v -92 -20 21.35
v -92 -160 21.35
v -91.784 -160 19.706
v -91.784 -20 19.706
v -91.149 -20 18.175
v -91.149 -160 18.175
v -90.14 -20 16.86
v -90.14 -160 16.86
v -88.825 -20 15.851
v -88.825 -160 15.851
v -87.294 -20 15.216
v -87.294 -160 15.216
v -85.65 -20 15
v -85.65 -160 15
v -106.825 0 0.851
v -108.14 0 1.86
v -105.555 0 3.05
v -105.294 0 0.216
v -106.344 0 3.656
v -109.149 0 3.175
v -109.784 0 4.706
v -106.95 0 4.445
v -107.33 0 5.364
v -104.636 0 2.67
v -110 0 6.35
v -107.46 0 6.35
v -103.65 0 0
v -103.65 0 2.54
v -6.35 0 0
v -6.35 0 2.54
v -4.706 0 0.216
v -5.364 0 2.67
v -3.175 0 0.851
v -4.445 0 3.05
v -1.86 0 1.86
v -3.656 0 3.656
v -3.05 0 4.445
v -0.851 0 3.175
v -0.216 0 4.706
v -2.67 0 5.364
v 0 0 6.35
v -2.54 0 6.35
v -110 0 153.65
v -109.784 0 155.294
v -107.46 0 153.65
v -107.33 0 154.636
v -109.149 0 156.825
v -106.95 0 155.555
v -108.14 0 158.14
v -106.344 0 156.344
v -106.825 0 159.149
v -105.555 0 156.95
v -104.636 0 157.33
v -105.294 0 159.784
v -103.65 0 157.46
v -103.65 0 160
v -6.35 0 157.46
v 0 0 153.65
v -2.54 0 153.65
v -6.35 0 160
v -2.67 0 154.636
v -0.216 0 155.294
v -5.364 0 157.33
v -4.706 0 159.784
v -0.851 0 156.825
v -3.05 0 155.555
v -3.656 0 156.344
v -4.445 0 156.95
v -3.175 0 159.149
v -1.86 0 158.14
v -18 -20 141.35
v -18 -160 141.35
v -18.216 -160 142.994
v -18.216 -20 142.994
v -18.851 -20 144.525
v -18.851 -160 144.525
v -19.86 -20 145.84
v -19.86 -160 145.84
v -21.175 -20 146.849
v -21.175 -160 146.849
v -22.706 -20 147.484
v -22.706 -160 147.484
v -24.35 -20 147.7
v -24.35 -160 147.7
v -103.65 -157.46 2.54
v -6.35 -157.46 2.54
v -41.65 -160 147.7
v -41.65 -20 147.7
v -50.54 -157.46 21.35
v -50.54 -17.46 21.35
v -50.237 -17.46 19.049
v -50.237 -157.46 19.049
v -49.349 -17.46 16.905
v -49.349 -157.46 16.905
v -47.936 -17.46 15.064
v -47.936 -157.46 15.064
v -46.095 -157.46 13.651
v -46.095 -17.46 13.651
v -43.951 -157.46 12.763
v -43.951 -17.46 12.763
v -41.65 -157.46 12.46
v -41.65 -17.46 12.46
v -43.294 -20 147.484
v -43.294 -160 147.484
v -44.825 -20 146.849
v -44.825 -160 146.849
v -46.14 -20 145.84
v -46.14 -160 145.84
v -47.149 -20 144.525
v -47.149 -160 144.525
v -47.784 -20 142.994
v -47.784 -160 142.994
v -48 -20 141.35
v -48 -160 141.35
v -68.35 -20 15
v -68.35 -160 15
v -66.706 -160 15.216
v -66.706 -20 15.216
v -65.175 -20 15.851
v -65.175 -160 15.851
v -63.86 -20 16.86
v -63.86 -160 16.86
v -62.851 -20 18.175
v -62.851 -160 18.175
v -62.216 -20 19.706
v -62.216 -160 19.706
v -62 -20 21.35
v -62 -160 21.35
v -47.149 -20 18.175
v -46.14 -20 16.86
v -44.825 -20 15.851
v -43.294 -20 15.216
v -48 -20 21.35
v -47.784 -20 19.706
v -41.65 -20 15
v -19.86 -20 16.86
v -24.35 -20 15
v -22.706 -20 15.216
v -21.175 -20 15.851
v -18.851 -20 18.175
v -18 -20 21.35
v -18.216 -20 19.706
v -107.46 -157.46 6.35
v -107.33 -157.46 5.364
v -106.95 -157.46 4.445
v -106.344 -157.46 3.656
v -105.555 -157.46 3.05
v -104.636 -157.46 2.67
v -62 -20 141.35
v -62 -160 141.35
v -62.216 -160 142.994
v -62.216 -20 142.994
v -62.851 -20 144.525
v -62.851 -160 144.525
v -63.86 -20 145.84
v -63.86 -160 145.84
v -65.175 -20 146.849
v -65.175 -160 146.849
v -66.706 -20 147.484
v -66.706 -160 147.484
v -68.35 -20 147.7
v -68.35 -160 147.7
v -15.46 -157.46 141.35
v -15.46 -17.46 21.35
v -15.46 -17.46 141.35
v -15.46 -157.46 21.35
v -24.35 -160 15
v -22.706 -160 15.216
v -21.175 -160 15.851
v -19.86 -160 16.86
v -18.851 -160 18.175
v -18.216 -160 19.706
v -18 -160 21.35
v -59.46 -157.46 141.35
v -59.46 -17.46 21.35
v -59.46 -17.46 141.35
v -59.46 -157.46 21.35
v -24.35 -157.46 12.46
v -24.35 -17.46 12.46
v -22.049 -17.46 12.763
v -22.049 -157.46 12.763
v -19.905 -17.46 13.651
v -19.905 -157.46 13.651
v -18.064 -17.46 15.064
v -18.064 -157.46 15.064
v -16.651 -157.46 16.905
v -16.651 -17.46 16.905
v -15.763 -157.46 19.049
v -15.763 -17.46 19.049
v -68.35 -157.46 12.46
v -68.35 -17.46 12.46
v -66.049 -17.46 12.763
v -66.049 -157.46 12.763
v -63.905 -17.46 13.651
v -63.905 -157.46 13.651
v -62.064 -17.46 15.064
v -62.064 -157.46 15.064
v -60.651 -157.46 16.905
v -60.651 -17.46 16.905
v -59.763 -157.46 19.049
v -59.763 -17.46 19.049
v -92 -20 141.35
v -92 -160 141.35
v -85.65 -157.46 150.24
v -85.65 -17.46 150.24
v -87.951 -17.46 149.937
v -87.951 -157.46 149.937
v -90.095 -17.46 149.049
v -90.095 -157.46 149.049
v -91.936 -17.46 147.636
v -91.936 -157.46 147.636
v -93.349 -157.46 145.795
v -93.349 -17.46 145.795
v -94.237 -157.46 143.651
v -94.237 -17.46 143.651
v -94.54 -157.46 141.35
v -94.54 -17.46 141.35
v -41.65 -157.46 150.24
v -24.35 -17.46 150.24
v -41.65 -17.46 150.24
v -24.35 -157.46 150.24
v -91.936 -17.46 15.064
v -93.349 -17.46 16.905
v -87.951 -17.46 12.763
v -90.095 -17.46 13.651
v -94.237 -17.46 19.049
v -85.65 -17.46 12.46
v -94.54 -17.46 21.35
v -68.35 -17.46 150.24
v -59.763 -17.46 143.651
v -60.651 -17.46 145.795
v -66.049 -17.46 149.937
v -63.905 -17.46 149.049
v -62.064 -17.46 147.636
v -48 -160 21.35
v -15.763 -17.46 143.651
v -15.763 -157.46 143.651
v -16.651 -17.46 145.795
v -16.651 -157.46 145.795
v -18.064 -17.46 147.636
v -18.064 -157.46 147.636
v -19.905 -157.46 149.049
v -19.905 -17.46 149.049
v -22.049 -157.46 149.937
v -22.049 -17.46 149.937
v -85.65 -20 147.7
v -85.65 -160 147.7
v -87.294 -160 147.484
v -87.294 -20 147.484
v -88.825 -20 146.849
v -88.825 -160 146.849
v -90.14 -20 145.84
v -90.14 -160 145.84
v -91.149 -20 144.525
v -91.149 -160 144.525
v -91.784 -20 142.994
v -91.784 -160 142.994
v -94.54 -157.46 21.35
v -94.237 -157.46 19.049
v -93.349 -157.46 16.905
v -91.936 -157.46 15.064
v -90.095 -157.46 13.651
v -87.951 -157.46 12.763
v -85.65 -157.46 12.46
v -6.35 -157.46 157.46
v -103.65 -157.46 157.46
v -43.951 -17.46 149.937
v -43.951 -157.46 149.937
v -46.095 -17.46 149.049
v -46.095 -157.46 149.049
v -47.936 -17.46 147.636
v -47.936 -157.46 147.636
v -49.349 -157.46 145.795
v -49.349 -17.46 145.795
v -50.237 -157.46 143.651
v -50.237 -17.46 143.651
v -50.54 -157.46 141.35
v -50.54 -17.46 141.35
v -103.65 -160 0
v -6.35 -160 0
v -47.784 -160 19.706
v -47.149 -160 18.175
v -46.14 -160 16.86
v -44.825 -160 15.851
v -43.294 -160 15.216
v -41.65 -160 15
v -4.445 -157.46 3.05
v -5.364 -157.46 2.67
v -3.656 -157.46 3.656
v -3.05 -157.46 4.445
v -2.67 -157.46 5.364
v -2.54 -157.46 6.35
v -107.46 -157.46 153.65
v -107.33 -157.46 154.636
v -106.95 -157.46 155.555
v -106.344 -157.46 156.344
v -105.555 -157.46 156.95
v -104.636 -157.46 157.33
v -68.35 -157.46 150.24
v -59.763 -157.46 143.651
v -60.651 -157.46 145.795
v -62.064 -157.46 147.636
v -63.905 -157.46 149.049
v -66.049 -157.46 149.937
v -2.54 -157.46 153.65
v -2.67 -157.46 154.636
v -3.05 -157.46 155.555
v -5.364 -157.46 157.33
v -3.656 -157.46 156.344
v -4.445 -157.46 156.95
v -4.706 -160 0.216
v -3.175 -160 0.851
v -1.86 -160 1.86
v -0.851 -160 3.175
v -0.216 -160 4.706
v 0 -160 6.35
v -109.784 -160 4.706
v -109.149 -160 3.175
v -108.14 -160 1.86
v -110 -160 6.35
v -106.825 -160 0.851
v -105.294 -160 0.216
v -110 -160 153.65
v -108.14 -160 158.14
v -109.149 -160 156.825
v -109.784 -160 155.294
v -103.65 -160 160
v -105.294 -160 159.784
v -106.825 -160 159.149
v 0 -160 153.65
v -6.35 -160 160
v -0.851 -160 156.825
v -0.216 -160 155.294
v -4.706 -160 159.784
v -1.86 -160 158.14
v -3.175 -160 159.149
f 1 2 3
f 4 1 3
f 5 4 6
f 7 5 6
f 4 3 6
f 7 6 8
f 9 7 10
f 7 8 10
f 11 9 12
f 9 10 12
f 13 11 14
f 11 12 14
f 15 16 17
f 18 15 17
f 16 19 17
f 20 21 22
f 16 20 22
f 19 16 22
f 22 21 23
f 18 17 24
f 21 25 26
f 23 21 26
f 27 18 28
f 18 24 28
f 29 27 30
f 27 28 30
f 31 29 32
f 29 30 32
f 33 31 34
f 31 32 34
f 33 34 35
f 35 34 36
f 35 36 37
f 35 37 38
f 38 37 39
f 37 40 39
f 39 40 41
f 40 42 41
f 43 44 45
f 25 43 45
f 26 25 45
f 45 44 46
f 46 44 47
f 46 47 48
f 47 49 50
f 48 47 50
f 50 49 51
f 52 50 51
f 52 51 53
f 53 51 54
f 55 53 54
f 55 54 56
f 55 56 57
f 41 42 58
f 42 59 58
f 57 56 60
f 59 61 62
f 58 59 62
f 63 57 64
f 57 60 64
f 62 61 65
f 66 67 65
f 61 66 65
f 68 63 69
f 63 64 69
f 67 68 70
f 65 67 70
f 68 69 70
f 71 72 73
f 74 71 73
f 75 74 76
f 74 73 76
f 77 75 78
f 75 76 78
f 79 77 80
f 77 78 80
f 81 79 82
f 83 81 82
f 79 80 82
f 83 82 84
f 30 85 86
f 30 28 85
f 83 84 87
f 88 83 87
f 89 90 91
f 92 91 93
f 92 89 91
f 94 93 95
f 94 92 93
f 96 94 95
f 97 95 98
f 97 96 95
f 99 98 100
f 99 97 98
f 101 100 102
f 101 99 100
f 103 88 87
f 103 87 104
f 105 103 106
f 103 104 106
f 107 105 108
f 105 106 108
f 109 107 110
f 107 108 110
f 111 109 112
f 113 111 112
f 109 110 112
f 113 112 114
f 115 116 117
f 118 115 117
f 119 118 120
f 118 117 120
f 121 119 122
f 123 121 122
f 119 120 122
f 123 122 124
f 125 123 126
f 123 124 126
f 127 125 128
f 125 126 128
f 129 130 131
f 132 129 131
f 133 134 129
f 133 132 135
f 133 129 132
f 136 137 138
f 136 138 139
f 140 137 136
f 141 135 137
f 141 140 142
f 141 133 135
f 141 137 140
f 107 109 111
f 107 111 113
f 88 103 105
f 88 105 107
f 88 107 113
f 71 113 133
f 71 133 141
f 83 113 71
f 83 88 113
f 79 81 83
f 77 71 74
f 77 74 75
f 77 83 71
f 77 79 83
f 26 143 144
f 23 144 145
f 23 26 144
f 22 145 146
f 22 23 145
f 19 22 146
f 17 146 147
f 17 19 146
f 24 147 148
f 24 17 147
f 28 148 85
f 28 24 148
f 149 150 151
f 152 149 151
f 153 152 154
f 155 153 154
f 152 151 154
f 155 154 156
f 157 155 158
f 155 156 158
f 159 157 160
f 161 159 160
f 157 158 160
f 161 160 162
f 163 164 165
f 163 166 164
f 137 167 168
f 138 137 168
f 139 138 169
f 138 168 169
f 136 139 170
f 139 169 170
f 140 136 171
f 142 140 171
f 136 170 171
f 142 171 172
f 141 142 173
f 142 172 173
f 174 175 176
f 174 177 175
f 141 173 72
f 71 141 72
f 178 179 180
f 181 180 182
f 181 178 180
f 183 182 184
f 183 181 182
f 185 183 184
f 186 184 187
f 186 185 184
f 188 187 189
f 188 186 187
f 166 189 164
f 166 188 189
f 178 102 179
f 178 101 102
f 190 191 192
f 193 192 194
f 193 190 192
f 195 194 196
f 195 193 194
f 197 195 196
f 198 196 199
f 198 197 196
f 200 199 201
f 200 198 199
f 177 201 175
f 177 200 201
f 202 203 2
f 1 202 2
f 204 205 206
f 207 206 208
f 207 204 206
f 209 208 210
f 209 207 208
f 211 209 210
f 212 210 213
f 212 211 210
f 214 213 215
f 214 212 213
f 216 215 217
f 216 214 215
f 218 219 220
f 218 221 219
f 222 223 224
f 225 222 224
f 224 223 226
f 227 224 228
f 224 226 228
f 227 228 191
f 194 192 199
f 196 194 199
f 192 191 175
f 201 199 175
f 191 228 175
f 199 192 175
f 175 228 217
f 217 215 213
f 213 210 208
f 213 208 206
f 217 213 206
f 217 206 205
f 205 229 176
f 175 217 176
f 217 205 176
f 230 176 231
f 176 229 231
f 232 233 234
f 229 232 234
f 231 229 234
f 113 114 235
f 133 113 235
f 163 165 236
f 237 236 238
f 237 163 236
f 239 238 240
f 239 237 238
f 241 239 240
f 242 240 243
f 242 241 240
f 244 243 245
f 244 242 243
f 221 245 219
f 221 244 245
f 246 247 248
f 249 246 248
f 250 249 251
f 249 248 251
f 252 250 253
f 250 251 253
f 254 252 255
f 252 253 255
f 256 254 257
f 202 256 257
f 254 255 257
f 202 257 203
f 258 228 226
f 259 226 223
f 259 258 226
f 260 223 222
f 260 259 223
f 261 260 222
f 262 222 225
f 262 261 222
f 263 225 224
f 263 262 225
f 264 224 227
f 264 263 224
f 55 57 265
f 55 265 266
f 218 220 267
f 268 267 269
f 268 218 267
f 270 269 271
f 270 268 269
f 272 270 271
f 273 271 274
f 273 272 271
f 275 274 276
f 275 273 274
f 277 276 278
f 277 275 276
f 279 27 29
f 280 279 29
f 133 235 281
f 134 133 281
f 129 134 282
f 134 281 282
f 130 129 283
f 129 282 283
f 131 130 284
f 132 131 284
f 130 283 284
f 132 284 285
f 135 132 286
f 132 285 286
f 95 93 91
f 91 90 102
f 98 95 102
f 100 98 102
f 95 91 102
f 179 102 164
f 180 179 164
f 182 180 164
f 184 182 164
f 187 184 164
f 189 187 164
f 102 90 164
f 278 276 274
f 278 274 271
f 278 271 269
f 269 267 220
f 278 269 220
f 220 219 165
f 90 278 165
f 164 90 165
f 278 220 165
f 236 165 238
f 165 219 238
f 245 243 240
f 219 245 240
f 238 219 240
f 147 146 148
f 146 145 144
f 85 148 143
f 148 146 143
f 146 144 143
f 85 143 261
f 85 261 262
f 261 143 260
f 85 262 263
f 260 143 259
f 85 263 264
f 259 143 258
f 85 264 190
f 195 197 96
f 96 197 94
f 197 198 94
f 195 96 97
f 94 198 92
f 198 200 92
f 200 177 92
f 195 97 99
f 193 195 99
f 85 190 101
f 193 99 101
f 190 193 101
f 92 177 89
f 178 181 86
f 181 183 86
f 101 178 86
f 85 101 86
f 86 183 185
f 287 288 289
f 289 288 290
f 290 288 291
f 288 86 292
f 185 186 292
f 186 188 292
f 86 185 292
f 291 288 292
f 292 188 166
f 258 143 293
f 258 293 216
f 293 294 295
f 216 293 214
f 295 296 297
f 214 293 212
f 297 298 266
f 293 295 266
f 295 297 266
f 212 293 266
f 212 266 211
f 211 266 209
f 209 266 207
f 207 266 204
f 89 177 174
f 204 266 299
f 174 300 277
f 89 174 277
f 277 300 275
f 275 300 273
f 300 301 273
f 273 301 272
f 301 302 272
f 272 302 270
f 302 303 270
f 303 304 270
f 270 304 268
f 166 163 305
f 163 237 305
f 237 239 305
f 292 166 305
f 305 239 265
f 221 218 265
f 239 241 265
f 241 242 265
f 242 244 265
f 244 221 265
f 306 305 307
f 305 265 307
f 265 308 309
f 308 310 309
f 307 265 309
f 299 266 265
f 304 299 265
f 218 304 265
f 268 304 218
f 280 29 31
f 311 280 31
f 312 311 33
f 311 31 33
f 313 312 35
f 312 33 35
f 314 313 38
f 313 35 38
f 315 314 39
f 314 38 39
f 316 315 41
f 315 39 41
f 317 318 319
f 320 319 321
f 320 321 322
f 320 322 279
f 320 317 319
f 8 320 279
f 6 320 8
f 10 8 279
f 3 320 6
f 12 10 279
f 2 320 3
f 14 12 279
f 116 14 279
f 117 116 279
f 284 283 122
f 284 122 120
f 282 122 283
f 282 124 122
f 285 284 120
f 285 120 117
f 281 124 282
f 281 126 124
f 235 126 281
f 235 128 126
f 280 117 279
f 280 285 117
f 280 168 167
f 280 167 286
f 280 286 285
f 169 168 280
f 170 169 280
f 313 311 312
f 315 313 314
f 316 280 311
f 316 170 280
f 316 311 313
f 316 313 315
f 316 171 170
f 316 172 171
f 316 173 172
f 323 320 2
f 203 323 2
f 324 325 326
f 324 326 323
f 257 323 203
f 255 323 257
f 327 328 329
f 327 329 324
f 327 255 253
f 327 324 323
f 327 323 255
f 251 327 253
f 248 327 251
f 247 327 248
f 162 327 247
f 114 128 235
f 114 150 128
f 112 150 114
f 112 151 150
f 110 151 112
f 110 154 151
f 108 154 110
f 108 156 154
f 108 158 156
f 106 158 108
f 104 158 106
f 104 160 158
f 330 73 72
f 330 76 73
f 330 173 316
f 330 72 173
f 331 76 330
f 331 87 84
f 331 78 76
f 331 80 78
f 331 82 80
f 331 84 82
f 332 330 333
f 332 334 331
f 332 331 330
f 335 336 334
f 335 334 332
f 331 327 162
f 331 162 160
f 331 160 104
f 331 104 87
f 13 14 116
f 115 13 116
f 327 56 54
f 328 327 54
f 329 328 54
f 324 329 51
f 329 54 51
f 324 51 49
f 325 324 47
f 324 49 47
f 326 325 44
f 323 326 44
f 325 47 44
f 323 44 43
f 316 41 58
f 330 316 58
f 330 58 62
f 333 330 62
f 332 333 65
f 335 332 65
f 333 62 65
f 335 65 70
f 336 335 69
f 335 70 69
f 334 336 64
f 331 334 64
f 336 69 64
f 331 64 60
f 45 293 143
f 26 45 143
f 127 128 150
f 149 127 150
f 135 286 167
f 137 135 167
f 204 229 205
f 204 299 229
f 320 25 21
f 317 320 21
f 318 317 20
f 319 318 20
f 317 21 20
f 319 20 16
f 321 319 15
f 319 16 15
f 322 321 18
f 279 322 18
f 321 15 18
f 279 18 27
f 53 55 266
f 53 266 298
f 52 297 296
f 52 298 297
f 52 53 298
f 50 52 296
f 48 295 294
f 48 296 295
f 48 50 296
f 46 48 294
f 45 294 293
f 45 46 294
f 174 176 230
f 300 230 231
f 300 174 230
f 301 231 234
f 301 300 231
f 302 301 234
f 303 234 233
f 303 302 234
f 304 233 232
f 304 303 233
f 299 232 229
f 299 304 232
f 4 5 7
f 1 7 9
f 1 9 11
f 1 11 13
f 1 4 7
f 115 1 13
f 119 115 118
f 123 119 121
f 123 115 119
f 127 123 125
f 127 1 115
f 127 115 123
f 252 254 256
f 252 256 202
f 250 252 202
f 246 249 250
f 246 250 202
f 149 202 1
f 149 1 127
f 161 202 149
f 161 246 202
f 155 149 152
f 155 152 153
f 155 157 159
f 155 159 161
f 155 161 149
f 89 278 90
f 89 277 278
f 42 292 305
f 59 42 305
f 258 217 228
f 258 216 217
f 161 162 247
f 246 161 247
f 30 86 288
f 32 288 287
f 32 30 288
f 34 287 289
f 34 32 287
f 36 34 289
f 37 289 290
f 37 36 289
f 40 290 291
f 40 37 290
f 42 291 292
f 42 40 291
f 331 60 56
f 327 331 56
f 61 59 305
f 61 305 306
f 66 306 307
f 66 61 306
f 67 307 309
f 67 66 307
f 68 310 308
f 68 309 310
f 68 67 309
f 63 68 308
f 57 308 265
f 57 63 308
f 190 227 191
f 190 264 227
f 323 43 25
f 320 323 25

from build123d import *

# Parameters (mm, degrees)
F1_DEPTH = 160
F3_DEPTH = 140
F4_T     = -2.54


with BuildPart() as f1:
    # F0 (on Front) → F1 (new body)
    with BuildSketch(Plane.XZ):
        with BuildLine():
            Line((-103.65, 0), (-6.35, 0))
            ThreePointArc((-6.35, 0), (-1.8598719395, 1.8598719395), (0, 6.35))
            Line((0, 6.35), (0, 153.65))
            ThreePointArc((0, 153.65), (-1.8598719395, 158.1401280605), (-6.35, 160))
            Line((-6.35, 160), (-103.65, 160))
            ThreePointArc((-103.65, 160), (-108.1401280605, 158.1401280605), (-110, 153.65))
            Line((-110, 153.65), (-110, 6.35))
            ThreePointArc((-110, 6.35), (-108.1401280605, 1.8598719395), (-103.65, 0))
        make_face()
    extrude(amount=F1_DEPTH)

    # F2 (on face) → F3 (cut)
    with BuildSketch(Plane.XZ.offset(160)):
        with BuildLine():
            Line((-24.35, 147.7), (-41.65, 147.7))
            ThreePointArc((-41.65, 147.7), (-46.1401280605, 145.8401280605), (-48, 141.35))
            Line((-48, 141.35), (-48, 21.35))
            ThreePointArc((-48, 21.35), (-46.1401280605, 16.8598719395), (-41.65, 15))
            Line((-41.65, 15), (-24.35, 15))
            ThreePointArc((-24.35, 15), (-19.8598719395, 16.8598719395), (-18, 21.35))
            Line((-18, 21.35), (-18, 141.35))
            ThreePointArc((-18, 141.35), (-19.8598719395, 145.8401280605), (-24.35, 147.7))
        make_face()
        with BuildLine():
            Line((-68.35, 147.7), (-85.65, 147.7))
            ThreePointArc((-85.65, 147.7), (-90.1401280605, 145.8401280605), (-92, 141.35))
            Line((-92, 141.35), (-92, 21.35))
            ThreePointArc((-92, 21.35), (-90.1401280605, 16.8598719395), (-85.65, 15))
            Line((-85.65, 15), (-68.35, 15))
            ThreePointArc((-68.35, 15), (-63.8598719395, 16.8598719395), (-62, 21.35))
            Line((-62, 21.35), (-62, 141.35))
            ThreePointArc((-62, 141.35), (-63.8598719395, 145.8401280605), (-68.35, 147.7))
        make_face()
    extrude(amount=-F3_DEPTH, mode=Mode.SUBTRACT)

    # F4
    f4_openings = [f1.faces().sort_by_distance(p)[0] for p in [
        (-55, 0, 80),
    ]]
    offset(amount=F4_T, openings=f4_openings, kind=Kind.INTERSECTION)


solid = f1.part
